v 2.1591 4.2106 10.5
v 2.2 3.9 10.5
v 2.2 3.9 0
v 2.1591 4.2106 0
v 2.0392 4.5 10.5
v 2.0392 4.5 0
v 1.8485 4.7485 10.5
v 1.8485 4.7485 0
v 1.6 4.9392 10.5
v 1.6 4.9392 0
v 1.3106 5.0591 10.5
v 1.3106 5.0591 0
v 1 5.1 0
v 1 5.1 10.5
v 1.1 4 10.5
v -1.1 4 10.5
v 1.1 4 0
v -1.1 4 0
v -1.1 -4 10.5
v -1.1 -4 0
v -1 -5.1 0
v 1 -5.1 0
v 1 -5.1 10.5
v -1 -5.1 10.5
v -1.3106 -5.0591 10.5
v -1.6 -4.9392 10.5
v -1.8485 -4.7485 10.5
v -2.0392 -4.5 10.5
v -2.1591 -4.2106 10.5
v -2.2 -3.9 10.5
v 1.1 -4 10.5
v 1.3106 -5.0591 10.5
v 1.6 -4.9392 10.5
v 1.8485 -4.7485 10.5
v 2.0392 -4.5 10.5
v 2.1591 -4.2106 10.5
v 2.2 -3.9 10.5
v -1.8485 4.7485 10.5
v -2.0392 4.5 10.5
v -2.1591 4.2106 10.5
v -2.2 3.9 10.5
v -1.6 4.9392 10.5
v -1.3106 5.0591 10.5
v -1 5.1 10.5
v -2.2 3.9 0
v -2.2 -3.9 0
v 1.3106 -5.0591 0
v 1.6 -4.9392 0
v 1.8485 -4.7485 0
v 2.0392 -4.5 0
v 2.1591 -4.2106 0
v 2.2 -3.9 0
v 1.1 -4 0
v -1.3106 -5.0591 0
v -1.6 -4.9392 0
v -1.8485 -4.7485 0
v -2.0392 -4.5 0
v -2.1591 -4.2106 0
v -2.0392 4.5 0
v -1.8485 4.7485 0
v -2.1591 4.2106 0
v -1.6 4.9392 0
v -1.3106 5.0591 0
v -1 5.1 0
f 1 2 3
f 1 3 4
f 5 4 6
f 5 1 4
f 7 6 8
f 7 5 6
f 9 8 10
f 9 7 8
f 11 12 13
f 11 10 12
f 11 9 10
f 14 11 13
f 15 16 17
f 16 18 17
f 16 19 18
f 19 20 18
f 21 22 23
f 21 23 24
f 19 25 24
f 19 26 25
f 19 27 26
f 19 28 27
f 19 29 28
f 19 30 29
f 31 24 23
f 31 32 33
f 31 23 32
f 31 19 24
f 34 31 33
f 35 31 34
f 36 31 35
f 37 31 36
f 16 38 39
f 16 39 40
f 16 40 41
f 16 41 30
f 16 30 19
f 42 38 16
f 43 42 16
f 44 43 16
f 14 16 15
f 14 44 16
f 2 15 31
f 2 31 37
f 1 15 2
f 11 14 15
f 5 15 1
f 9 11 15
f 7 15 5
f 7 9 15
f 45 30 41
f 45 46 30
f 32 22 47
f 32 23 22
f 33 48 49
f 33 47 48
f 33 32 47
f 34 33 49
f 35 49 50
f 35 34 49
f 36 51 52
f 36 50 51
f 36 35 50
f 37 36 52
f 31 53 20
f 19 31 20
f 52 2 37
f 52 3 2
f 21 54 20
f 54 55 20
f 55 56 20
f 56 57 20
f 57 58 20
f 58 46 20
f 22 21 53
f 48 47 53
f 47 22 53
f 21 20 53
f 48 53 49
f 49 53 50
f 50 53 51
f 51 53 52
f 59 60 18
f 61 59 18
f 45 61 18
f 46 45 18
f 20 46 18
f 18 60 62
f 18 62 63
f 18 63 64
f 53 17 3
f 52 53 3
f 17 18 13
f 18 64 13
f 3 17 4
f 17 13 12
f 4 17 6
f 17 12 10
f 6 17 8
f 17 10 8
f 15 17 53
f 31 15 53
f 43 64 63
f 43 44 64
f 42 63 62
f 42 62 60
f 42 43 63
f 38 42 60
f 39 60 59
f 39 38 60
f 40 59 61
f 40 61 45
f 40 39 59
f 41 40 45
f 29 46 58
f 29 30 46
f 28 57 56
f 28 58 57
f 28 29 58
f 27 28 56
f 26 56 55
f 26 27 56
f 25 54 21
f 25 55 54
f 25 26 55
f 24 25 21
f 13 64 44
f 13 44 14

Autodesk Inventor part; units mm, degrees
ref_plane "YZ Plane" through (0, 0, 0) normal (1, 0, 0) x (0, 1, 0)
ref_plane "XZ Plane" through (0, 0, 0) normal (0, 1, 0) x (-1, 0, 0)
ref_plane "XY Plane" through (0, 0, 0) normal (0, 0, 1) x (1, 0, 0)
sketch "Sketch1" plane through (0, 0, 0) normal (0, 0, 1) x (1, 0, 0)
  line L0 (-1.1, 4) -> (1.1, 4)
  line L1 (1.1, 4) -> (1.1, -4)
  line L2 (1.1, -4) -> (-1.1, -4)
  line L3 (-1.1, -4) -> (-1.1, 4)
  line L4 (-2.2, 5.1) -> (2.2, 5.1)
  line L5 (2.2, 5.1) -> (2.2, -5.1)
  line L6 (2.2, -5.1) -> (-2.2, -5.1)
  line L7 (-2.2, -5.1) -> (-2.2, 5.1)
  point P0 (0, 0)
  dimension "d0" = 2.2
  dimension "d1" = 8
  dimension "d2" = 1.1
  dimension "d3" = 4
  dimension "d4" = 2.2
  dimension "d5" = 2.2
  dimension "d6" = 1.1
  dimension "d7" = 1.1
  dimension "d8" = 1.1
extrude "Extrusion1" add sketch "Sketch1" along normal blind 10.5
fillet "Fillet1" radius 1.2 4 edges at (2.2, 5.1, 5.25) (-2.2, 5.1, 5.25) (-2.2, -5.1, 5.25) (2.2, -5.1, 5.25)
equation "\"d2\" = 0.5 * d0"
equation "\"d3\" = 0.5 * d1"
equation "\"d5\" = d4"
equation "\"d7\" = d6"
equation "\"d8\" = d6"
properties part number "coil"
